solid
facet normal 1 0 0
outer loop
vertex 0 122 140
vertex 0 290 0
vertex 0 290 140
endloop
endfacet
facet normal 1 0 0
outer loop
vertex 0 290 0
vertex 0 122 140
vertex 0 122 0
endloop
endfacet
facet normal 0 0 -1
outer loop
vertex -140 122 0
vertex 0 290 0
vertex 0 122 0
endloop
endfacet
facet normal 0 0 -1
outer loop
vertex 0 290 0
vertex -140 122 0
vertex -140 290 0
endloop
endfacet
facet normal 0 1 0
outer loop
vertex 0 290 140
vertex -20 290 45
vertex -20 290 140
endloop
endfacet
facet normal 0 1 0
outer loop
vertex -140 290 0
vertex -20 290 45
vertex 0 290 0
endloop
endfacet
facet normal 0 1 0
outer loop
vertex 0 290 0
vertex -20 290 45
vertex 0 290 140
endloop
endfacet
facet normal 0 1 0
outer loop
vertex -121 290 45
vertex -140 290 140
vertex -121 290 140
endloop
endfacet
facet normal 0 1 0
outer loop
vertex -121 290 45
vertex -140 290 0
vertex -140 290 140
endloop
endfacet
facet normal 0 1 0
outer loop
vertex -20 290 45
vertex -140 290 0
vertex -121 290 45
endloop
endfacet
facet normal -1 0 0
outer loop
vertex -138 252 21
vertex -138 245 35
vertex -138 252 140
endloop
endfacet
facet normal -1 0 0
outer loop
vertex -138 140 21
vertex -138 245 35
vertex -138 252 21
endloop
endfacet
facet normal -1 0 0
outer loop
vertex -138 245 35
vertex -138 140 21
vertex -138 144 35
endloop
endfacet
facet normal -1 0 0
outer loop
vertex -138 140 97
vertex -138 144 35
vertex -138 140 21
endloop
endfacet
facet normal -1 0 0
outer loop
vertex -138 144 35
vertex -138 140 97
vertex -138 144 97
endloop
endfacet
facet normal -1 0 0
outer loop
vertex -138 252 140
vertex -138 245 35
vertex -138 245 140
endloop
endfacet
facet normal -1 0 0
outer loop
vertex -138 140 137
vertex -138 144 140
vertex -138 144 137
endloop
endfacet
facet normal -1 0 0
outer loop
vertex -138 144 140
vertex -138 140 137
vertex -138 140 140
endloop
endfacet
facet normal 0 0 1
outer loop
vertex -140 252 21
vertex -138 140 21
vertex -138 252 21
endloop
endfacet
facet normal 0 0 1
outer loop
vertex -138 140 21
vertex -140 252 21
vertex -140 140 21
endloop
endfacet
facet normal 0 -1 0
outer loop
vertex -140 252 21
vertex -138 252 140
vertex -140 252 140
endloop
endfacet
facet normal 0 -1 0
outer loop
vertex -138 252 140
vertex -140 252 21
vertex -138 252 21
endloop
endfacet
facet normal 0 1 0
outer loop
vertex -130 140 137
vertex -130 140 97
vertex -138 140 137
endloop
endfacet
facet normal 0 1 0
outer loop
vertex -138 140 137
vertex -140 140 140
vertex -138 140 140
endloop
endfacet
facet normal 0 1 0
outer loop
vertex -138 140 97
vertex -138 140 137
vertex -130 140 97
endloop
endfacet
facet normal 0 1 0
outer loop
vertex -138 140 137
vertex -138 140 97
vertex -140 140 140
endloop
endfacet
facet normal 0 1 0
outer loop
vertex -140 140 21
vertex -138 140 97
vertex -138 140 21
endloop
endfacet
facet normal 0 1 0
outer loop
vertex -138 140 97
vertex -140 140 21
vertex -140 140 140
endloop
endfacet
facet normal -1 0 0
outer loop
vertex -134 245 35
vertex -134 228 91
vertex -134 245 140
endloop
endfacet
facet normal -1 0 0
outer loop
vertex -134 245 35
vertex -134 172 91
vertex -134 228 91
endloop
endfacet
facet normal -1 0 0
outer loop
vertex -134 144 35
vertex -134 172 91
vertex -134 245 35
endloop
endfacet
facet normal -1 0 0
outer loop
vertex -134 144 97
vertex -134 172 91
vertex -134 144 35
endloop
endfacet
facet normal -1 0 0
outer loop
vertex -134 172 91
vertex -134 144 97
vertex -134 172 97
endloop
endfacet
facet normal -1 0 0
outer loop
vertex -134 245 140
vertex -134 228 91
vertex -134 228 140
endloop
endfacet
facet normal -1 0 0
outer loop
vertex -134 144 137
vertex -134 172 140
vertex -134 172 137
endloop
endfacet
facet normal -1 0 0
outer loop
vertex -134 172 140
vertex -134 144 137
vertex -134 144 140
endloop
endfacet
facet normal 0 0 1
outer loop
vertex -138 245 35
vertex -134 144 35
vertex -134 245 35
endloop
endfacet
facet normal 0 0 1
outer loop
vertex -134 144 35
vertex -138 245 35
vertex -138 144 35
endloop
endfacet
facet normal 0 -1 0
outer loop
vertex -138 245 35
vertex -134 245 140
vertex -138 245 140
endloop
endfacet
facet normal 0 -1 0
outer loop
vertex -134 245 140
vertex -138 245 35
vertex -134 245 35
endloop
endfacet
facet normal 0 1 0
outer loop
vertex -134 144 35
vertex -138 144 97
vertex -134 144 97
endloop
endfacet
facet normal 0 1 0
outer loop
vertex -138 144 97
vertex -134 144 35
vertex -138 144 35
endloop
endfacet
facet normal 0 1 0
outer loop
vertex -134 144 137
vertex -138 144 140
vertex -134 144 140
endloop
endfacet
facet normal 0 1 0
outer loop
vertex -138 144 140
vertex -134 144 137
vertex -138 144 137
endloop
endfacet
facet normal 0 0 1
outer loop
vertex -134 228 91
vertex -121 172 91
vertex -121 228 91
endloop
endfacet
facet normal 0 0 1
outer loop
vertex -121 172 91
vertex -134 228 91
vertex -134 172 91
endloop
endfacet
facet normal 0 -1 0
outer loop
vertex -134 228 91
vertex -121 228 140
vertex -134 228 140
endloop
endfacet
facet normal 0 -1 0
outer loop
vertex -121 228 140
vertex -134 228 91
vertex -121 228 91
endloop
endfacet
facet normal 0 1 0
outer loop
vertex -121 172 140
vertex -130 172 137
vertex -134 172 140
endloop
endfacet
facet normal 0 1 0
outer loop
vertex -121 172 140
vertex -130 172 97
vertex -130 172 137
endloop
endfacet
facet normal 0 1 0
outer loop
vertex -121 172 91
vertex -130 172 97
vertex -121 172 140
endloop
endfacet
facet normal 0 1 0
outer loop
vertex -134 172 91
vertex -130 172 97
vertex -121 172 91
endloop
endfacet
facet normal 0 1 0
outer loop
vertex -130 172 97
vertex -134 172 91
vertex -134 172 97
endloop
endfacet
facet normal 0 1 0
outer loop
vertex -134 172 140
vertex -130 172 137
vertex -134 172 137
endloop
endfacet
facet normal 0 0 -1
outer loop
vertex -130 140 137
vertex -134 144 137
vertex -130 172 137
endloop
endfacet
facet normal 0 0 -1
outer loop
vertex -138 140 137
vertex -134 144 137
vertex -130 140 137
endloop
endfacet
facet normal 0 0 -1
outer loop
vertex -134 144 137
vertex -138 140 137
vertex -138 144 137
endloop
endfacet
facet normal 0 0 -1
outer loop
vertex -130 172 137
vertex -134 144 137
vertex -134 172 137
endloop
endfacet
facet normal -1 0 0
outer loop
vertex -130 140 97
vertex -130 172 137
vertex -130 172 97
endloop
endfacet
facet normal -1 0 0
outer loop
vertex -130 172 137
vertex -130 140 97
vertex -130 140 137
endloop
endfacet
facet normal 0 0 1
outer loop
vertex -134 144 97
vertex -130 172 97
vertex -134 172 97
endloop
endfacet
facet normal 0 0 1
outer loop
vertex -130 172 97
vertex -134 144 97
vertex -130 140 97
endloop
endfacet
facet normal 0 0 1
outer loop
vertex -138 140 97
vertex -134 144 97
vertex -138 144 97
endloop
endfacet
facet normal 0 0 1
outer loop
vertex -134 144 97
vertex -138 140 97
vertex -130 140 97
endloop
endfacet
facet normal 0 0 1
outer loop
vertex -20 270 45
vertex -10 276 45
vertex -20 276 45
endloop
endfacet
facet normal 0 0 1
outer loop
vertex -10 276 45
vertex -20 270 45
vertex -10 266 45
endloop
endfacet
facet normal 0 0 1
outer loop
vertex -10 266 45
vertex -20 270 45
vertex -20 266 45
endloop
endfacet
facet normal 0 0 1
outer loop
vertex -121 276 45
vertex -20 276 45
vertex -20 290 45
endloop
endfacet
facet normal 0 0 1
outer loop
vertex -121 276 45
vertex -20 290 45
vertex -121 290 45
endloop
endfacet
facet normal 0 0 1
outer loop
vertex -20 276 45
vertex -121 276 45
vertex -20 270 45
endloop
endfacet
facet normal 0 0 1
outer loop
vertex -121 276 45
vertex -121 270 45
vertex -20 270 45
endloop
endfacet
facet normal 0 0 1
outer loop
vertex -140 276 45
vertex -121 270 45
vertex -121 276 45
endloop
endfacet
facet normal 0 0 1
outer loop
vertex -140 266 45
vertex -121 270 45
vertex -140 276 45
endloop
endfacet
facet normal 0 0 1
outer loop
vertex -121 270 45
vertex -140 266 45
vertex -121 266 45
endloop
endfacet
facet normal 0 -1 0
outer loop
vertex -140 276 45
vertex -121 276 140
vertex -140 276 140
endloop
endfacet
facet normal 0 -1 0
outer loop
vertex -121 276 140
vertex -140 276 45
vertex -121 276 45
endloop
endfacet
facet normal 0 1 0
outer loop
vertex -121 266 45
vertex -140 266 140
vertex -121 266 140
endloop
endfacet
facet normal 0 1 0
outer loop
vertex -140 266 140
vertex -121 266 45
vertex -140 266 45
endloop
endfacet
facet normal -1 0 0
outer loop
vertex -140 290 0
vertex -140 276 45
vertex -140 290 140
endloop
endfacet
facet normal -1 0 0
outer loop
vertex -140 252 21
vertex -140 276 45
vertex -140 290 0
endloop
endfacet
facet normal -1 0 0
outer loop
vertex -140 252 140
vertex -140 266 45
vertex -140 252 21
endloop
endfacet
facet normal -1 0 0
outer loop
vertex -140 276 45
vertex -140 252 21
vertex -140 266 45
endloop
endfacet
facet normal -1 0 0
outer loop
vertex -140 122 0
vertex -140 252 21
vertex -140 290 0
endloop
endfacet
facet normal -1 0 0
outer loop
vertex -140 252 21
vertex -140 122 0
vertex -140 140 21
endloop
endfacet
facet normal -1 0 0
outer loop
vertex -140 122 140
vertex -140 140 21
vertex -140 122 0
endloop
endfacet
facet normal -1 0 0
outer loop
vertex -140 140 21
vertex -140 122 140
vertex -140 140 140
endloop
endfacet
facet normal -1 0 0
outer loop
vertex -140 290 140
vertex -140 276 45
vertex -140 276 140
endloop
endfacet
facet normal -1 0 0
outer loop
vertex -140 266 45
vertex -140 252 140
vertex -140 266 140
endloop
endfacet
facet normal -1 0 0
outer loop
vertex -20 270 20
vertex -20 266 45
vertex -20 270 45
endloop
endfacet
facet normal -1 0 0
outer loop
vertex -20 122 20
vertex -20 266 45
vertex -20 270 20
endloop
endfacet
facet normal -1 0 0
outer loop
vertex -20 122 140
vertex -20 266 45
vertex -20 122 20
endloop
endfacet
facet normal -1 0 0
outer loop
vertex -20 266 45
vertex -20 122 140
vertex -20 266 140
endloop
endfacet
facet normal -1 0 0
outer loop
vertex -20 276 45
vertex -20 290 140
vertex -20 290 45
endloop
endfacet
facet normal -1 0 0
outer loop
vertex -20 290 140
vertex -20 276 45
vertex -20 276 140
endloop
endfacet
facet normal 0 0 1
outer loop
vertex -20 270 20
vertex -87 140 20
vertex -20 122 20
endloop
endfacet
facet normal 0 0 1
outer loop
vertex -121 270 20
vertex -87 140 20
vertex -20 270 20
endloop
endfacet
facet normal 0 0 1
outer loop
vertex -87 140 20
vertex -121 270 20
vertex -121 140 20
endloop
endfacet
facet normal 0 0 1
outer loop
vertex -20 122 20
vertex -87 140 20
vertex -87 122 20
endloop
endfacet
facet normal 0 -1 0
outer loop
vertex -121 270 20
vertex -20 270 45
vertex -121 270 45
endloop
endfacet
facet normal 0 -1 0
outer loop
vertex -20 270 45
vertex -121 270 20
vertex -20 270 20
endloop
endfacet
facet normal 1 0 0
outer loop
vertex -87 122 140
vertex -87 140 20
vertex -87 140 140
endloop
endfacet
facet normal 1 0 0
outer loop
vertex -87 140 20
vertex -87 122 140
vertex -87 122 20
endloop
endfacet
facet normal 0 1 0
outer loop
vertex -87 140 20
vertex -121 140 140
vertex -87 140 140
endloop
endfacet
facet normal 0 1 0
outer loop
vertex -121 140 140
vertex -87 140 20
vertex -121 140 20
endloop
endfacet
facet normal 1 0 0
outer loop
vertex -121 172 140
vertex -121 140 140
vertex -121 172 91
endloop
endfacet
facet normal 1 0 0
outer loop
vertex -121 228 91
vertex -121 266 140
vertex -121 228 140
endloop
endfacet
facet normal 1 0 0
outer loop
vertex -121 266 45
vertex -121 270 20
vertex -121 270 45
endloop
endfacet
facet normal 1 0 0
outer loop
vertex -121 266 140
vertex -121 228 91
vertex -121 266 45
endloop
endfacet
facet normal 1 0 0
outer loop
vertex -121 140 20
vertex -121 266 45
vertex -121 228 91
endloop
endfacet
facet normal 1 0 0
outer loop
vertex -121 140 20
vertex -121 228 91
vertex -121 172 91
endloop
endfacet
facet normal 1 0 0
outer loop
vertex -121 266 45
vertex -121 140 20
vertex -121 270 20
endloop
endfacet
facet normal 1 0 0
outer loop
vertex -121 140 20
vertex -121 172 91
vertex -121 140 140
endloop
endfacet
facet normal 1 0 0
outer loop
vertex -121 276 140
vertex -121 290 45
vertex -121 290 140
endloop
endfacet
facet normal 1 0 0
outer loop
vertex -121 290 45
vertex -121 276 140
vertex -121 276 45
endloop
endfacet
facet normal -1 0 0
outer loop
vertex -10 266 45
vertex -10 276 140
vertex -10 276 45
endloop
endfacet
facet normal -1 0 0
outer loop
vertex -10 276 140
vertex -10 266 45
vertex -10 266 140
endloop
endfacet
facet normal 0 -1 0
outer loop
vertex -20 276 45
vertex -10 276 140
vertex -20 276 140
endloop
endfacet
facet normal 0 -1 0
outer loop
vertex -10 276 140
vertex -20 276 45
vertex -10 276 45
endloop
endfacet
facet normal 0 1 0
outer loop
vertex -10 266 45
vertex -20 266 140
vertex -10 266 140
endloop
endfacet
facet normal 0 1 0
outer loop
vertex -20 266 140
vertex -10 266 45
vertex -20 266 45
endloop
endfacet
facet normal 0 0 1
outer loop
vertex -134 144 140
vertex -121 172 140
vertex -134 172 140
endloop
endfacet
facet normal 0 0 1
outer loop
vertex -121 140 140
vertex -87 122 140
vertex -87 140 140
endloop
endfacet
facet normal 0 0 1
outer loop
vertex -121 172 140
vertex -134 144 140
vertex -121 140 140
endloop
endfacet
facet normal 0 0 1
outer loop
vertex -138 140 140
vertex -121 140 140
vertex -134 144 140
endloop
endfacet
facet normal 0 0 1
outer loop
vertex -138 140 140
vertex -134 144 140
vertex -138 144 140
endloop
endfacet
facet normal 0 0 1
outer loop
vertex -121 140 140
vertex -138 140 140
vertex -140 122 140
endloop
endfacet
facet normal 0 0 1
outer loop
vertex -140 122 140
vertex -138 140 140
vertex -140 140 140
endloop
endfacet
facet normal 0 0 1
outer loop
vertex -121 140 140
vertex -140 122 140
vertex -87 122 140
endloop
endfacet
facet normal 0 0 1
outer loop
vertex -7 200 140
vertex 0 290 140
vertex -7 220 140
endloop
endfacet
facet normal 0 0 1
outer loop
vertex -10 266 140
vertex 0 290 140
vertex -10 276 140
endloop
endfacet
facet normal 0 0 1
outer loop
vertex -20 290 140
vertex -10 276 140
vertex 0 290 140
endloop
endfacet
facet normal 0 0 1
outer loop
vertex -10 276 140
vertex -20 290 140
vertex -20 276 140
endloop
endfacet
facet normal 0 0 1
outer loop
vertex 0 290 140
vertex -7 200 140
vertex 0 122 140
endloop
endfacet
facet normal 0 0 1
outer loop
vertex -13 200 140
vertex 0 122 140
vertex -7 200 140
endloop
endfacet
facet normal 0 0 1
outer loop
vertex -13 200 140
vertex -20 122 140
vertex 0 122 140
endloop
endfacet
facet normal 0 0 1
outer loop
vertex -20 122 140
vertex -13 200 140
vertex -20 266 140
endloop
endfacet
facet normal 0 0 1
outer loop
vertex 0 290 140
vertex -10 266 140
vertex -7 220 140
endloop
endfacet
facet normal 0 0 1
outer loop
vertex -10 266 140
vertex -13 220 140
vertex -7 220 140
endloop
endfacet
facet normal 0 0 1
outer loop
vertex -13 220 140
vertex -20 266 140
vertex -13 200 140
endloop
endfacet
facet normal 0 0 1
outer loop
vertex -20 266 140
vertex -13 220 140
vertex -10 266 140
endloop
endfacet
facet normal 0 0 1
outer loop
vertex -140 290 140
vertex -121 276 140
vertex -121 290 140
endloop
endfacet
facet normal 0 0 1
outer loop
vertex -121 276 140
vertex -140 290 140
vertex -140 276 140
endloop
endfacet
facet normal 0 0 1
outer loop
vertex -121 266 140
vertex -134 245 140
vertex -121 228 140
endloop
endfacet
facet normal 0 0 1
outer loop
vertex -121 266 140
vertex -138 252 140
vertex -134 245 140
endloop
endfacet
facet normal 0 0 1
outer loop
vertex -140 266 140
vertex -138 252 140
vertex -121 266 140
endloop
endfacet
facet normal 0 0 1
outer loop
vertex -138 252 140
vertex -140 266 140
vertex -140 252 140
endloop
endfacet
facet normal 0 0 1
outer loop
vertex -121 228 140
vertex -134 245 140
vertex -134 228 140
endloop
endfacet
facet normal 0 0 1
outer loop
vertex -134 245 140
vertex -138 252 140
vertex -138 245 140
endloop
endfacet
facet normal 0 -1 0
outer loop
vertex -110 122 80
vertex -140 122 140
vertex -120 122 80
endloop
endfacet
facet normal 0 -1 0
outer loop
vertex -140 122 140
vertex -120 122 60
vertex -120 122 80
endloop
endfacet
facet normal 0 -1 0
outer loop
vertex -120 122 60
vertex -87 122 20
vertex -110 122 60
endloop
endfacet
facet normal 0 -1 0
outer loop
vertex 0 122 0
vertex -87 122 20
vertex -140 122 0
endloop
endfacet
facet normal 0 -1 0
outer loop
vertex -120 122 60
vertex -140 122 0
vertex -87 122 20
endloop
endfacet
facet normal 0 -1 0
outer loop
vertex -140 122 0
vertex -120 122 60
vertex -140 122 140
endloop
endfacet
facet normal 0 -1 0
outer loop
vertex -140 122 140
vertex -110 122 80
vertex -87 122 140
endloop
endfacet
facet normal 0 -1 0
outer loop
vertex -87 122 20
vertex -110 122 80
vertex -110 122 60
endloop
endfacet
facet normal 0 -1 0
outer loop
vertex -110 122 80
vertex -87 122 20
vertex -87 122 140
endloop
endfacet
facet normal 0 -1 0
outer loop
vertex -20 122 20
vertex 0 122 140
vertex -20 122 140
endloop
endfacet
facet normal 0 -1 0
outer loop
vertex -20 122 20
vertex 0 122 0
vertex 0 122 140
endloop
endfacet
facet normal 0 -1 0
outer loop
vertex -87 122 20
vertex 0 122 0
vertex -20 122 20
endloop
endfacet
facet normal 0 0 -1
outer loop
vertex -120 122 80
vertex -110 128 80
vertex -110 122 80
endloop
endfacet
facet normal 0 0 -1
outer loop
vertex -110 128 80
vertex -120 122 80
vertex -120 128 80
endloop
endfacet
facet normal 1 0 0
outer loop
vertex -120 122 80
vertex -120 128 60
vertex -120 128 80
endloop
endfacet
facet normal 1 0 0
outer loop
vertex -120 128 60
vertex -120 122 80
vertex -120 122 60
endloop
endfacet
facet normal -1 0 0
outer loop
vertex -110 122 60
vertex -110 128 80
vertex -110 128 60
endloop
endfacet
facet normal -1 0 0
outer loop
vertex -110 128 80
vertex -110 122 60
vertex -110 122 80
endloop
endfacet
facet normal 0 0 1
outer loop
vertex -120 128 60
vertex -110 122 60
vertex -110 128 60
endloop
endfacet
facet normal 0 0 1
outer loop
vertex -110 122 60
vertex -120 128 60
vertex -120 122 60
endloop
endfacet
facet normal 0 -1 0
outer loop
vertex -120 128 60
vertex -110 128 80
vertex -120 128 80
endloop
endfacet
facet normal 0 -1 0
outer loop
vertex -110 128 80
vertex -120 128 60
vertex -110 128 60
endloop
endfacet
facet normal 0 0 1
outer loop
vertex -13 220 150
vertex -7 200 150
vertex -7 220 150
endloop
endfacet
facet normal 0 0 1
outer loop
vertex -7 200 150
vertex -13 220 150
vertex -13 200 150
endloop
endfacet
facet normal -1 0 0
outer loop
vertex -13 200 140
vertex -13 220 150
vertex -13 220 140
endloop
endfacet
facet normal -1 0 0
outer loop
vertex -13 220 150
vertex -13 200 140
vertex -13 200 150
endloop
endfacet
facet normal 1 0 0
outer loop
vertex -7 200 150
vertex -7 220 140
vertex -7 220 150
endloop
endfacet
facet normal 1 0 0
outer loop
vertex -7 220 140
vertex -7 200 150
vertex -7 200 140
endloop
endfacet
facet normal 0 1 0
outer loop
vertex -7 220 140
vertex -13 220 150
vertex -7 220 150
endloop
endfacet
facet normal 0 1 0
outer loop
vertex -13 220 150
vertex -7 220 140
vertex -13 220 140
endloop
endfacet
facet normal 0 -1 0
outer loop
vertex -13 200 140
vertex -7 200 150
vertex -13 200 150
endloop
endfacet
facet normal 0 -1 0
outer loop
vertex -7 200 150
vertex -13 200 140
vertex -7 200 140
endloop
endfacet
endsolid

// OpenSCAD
rotate(a=90,v=[0,-1,0]) {
difference() {
    union() {
        difference() {
            cube([235,290,80]); // bottom
            
            union() {
                translate([168,20,78])
                cube([53,74,3]);    // nfc
                translate([180,94,78])
                cube([29,35,3]);    // nfc module
                translate([187,122,78])
                cube([14,20,3]);    // nfc line
                
                translate([50,-1,30])
                cube([57,11,5]);    // printer
            }
        }
        
        translate([0,60,80])
        rotate(a=90,v=[0,1,0]) {
            cylinder(r=60,h=140,$fn=50);    // front
        }
        
        difference() {
            translate([0,60,80])
            cube([140,65,60]);  // front2
        }
        
        difference() {
            translate([0,122,80])
            cube([235,168,60]); // back
            
            union() {
                translate([187,122,79])
                cube([14,20,6]);    // nfc line
                
                translate([21,140,138])
                cube([193,112,3]);  // lcd
                translate([35,144,134])
                cube([167,101,5]);  // lcd bottom
                translate([91,172,120])
                cube([65,56,15]);   // lcd module
                translate([97,140,130])
                cube([40,32,10]);    // lcd line
                
                translate([45,266,120])
                cube([145,10,21]);  // back lid
            }
        }
    }
    
    union() {
        translate([20,10,20])
        cube([195,260,40]); // inside bottom
        
        translate([20,10,60])
        cube([113,130,27]); // inside printer
        translate([20,140,60])
        cube([195,130,61]); // inside lcd
        
        translate([45,266,20])
        cube([145,25,101]); // inside back lid
        translate([45,266,10])
        cube([145,10,11]);  // inside bottom lid
        
        translate([140,-1,-1])
        cube([96,292,142]);
        translate([-1,-1,-1])
        cube([141,123,142]);
        
        translate([132,121,60])
        cube([9,20,27]);   // 133+7,122+18,60+27
        
        translate([60,121,110])
        cube([20,7,10]);
    }
}

translate([139,200,7])
cube([11,20,6]);

}
